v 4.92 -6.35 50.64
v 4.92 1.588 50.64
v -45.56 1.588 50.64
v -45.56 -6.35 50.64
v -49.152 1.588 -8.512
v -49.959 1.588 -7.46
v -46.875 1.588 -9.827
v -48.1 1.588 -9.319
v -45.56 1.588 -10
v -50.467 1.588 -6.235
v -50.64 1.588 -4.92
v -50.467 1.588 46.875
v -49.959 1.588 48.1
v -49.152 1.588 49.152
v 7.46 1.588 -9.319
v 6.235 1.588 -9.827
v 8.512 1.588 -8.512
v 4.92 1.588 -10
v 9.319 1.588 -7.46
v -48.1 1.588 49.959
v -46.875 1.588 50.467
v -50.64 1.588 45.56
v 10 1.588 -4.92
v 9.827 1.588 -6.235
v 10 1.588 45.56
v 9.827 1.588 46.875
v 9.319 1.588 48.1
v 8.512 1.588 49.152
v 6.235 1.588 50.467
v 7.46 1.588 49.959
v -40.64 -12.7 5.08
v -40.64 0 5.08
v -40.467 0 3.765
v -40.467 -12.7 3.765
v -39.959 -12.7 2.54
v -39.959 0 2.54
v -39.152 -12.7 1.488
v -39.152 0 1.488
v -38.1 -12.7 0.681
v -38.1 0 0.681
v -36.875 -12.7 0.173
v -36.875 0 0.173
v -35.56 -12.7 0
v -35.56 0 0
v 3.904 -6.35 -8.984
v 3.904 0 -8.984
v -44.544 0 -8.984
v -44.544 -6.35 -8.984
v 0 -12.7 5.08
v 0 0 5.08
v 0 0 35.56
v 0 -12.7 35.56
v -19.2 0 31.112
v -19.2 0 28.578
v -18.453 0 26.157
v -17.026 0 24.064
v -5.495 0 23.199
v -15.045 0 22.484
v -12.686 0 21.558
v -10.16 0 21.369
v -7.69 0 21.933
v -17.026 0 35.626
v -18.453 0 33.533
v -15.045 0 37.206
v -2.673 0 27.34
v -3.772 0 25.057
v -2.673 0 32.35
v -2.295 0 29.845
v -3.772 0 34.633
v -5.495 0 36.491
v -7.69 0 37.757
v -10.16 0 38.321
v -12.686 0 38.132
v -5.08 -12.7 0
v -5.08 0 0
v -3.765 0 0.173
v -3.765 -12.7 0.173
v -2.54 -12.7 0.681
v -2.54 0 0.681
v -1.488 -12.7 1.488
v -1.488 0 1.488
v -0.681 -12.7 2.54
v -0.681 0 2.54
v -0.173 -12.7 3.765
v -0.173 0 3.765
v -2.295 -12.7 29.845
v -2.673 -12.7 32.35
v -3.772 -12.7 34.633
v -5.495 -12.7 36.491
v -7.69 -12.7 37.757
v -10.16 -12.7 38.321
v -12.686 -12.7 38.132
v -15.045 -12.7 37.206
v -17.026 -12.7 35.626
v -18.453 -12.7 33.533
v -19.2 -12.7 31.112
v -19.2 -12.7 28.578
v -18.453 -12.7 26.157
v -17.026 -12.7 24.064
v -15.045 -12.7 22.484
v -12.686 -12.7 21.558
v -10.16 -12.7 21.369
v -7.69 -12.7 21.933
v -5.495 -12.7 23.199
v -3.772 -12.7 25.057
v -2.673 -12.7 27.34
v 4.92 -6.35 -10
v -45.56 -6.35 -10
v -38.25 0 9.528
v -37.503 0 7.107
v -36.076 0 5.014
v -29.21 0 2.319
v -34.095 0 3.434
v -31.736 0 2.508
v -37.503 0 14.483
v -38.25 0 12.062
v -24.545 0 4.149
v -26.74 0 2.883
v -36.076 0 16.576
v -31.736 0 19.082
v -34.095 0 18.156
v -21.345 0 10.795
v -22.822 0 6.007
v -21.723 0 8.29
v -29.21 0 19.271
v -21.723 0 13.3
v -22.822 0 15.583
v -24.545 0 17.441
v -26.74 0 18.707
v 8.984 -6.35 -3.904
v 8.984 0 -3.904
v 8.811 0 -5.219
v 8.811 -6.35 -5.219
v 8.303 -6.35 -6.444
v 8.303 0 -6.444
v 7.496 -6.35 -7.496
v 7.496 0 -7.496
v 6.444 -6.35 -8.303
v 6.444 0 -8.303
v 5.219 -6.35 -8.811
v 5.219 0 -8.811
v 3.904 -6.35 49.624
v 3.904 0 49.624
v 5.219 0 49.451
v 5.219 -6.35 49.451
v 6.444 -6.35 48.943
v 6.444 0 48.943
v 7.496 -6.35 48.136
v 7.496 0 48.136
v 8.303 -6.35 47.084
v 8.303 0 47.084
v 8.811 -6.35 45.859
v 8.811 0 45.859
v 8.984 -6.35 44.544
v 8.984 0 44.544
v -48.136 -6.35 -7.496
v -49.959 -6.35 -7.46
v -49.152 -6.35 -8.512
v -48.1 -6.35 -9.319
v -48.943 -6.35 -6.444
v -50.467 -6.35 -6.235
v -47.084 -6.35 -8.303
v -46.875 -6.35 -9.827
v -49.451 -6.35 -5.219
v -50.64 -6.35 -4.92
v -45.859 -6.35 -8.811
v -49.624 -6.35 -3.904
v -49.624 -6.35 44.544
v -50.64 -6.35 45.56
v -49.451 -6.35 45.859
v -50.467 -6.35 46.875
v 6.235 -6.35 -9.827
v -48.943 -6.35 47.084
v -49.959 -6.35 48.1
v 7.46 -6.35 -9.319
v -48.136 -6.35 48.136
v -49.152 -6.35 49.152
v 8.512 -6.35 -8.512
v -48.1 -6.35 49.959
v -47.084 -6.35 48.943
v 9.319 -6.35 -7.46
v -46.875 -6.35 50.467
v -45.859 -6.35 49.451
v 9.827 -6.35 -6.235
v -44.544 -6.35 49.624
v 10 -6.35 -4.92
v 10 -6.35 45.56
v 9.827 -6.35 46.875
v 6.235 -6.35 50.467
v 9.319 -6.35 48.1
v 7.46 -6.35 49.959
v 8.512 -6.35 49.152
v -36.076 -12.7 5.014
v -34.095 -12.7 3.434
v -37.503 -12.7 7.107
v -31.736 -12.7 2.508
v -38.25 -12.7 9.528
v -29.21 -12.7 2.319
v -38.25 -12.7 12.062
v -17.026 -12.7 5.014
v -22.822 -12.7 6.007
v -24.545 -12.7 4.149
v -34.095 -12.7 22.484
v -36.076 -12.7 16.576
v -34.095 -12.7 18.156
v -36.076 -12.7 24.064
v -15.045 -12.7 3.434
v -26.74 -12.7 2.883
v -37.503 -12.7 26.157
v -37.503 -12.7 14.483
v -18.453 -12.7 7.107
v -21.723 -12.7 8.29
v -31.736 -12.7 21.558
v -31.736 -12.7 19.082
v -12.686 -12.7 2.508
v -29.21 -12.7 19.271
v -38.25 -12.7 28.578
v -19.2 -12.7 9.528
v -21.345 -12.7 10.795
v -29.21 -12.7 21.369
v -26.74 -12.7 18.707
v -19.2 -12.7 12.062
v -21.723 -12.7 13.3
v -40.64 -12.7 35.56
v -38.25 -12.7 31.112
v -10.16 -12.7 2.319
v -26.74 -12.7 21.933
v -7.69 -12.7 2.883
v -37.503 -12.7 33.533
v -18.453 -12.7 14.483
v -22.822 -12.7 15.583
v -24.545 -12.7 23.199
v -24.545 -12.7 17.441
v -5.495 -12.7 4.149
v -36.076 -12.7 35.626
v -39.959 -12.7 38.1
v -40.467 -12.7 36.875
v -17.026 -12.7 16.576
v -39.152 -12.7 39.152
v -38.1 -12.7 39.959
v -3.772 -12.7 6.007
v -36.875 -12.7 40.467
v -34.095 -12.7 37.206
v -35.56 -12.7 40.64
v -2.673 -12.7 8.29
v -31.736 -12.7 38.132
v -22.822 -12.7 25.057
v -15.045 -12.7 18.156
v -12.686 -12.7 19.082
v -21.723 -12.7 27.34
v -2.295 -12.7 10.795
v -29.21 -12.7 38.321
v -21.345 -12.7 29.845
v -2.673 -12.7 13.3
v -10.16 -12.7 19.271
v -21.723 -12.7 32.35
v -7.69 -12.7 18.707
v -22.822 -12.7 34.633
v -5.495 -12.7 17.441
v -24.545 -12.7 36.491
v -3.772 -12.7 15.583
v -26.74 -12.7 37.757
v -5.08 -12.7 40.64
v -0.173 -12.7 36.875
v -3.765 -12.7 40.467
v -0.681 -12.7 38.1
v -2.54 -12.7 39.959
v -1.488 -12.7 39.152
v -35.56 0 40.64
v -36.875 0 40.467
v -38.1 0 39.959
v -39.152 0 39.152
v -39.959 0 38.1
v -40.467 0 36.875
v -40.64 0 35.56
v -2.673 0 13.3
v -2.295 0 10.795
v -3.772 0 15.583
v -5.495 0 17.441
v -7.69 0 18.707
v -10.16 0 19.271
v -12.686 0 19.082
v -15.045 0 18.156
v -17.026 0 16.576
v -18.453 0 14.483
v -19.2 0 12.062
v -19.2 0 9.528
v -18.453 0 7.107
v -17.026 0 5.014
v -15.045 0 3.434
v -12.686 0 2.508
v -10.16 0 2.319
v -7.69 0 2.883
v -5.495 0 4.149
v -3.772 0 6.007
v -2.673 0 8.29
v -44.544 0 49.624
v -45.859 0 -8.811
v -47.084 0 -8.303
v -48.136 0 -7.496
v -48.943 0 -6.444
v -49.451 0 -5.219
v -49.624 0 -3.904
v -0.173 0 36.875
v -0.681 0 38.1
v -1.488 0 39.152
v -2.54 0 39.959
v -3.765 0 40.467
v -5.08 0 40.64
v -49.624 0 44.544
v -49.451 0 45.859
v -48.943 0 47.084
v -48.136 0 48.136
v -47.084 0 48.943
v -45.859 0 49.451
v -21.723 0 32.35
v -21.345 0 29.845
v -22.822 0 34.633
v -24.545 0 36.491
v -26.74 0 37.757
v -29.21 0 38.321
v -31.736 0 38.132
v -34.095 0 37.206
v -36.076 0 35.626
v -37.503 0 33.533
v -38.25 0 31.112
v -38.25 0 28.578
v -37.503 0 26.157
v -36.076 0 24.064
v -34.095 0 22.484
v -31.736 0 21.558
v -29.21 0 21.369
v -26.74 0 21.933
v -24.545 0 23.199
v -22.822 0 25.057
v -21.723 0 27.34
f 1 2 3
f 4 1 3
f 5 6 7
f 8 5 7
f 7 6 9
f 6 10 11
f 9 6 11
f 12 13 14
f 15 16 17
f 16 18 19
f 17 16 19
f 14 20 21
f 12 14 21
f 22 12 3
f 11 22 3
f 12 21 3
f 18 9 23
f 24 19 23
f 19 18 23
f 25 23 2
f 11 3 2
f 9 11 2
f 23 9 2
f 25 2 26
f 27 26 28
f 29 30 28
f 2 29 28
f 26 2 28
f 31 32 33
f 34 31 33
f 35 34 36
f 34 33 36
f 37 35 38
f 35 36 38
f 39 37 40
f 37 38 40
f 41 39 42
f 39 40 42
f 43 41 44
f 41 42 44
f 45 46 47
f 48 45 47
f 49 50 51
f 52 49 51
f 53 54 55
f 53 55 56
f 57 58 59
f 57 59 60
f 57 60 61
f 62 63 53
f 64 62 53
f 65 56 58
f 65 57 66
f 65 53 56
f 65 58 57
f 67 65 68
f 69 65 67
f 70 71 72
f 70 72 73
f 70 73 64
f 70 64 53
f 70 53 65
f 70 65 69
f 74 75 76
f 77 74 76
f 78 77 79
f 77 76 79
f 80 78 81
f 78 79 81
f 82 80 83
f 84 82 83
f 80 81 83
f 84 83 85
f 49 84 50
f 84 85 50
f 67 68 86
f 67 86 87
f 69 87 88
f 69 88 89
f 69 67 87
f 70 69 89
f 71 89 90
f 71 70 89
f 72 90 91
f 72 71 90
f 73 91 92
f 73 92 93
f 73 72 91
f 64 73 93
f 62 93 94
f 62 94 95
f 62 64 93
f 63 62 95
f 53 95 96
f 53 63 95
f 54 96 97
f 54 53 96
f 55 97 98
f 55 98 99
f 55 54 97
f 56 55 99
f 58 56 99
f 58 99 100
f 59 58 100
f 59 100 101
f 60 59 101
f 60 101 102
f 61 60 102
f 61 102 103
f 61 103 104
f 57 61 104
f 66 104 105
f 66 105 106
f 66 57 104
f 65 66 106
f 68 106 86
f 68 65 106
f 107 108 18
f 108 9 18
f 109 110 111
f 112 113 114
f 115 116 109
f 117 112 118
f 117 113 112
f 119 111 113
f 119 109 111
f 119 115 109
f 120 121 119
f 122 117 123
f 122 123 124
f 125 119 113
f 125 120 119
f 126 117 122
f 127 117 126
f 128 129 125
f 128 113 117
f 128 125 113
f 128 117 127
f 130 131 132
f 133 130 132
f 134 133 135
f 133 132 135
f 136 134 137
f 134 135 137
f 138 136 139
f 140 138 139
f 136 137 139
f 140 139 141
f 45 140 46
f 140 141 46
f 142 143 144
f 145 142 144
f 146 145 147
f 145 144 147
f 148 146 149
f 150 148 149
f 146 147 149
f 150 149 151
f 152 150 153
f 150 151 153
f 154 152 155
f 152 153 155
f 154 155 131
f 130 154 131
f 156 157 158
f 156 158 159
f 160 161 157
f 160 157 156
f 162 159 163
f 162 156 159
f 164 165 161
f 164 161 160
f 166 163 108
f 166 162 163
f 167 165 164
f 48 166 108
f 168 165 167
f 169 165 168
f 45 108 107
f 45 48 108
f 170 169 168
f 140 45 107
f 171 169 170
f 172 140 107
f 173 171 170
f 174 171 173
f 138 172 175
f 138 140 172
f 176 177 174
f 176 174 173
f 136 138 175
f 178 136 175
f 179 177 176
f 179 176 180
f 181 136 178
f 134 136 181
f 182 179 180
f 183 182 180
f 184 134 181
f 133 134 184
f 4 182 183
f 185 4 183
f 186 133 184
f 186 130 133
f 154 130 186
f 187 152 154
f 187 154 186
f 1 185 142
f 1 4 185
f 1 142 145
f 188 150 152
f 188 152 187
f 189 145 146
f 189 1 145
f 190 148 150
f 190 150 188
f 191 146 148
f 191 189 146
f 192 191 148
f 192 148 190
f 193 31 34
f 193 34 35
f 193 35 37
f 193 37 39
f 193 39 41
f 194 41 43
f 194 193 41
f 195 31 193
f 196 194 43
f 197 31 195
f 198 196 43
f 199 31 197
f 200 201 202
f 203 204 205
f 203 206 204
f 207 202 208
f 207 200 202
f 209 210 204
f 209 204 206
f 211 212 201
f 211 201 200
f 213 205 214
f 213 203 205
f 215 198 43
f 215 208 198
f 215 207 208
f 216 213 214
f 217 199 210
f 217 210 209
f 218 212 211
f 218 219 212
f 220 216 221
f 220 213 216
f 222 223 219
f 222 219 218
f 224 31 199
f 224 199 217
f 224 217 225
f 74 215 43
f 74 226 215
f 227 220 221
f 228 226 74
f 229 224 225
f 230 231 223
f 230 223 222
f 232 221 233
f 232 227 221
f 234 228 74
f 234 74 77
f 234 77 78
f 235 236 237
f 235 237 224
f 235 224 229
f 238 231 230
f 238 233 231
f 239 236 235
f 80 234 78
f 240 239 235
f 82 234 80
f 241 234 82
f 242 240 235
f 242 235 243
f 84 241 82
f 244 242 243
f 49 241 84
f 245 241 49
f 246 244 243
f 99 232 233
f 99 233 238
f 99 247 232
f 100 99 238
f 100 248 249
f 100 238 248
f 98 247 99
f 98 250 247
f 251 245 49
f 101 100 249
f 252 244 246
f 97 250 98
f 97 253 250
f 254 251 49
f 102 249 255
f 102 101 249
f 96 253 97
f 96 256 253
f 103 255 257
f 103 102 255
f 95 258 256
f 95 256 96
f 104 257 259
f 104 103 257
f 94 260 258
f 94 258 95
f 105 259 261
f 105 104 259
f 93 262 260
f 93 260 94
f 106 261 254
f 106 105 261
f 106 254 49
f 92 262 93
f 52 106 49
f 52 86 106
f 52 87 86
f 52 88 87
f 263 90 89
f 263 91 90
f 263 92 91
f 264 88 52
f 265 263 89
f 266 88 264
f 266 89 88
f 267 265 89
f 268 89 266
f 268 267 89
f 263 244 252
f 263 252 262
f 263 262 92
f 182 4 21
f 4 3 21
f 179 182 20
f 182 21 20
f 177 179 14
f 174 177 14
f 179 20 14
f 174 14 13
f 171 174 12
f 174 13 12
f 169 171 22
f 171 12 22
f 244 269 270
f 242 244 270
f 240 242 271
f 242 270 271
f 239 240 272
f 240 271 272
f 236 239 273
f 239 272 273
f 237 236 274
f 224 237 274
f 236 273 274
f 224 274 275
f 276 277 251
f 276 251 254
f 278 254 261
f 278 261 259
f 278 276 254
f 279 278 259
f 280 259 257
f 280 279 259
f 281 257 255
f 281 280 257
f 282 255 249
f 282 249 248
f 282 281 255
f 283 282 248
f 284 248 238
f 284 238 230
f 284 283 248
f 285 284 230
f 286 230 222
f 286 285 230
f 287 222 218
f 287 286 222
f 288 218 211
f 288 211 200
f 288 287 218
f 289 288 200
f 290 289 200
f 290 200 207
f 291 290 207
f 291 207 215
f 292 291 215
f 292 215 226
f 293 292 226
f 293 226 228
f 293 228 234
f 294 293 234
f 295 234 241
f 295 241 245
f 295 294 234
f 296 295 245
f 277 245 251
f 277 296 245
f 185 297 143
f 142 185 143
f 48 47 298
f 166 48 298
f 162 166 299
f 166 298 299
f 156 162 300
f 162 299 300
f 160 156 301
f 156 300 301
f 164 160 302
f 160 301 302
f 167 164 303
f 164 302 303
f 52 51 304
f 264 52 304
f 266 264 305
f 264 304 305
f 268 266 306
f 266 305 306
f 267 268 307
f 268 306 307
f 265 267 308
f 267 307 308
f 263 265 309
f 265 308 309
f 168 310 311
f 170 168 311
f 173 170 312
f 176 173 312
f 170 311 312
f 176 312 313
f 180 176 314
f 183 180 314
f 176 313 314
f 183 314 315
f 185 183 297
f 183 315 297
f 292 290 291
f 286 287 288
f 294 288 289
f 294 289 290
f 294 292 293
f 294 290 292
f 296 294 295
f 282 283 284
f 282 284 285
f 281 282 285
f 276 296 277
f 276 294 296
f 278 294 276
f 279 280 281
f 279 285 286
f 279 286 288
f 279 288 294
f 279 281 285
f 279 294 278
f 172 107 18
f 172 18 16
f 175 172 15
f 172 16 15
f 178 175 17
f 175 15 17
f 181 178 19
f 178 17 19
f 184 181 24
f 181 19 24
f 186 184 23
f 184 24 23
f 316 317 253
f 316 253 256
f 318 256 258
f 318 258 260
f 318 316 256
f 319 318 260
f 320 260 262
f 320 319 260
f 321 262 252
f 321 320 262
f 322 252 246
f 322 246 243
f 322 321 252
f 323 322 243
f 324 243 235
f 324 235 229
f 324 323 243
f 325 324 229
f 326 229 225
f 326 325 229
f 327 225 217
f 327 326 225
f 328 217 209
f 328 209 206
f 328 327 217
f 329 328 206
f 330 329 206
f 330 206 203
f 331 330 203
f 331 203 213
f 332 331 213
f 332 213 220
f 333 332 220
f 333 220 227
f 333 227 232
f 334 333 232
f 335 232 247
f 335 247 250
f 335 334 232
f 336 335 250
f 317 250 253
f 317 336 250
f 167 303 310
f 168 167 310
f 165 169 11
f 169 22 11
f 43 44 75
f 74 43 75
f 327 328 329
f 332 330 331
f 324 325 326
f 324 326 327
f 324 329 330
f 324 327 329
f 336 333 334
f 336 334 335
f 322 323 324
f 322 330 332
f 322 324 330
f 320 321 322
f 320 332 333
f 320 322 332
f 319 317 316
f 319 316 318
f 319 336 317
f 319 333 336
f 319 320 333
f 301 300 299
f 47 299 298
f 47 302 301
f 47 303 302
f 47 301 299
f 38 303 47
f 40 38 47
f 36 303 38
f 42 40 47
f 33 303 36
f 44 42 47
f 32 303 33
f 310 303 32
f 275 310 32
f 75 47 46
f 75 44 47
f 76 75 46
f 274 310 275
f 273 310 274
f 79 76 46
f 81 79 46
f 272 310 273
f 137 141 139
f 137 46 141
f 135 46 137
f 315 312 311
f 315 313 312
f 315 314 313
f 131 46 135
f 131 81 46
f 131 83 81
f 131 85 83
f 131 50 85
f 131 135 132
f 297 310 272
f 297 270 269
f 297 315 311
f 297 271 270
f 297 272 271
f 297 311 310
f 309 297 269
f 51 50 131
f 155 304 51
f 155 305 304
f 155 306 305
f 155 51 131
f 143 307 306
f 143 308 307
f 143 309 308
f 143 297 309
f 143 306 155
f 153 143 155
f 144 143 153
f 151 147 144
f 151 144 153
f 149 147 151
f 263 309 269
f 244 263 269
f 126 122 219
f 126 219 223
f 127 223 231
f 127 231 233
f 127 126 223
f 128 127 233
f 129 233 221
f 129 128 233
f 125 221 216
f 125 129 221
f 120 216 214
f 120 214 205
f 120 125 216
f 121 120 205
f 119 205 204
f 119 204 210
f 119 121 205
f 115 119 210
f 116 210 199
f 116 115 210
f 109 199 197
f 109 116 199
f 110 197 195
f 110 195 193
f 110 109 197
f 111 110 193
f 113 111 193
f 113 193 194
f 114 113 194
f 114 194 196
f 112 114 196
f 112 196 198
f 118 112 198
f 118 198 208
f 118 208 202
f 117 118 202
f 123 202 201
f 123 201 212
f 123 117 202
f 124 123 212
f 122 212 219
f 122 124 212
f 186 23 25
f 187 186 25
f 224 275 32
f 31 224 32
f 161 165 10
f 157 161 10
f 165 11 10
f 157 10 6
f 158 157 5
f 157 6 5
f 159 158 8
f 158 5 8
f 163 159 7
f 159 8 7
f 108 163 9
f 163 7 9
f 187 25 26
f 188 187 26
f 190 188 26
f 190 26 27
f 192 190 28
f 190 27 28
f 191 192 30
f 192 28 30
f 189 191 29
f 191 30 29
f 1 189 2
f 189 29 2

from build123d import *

# Parameters (mm, degrees)
F0_R     = 8.5
F1_DEPTH = 1.5875
F2_DEPTH = 12.7
F3_DEPTH = 6.35


with BuildPart() as f1:
    # F0 (on Front) → F1 (new body)
    with BuildSketch(Plane.XZ):
        with BuildLine():
            Line((4.92, 50.64), (-45.56, 50.64))
            ThreePointArc((-45.56, 50.64), (-49.1521024484, 49.1521024484), (-50.64, 45.56))
            Line((-50.64, 45.56), (-50.64, -4.92))
            ThreePointArc((-50.64, -4.92), (-49.1521024484, -8.5121024484), (-45.56, -10))
            Line((-45.56, -10), (4.92, -10))
            ThreePointArc((4.92, -10), (8.5121024484, -8.5121024484), (10, -4.92))
            Line((10, -4.92), (10, 45.56))
            ThreePointArc((10, 45.56), (8.5121024484, 49.1521024484), (4.92, 50.64))
        make_face()
        with BuildLine():
            ThreePointArc((-49.624, 44.544), (-48.1361024484, 48.1361024484), (-44.544, 49.624))
            Line((-44.544, 49.624), (3.904, 49.624))
            ThreePointArc((3.904, 49.624), (7.4961024484, 48.1361024484), (8.984, 44.544))
            Line((8.984, 44.544), (8.984, -3.904))
            ThreePointArc((8.984, -3.904), (7.4961024484, -7.4961024484), (3.904, -8.984))
            Line((3.904, -8.984), (-44.544, -8.984))
            ThreePointArc((-44.544, -8.984), (-48.1361024484, -7.4961024484), (-49.624, -3.904))
            Line((-49.624, -3.904), (-49.624, 44.544))
        make_face(mode=Mode.SUBTRACT)
        with BuildLine():
            Line((3.904, 49.624), (-44.544, 49.624))
            ThreePointArc((-44.544, 49.624), (-48.1361024484, 48.1361024484), (-49.624, 44.544))
            Line((-49.624, 44.544), (-49.624, -3.904))
            ThreePointArc((-49.624, -3.904), (-48.1361024484, -7.4961024484), (-44.544, -8.984))
            Line((-44.544, -8.984), (3.904, -8.984))
            ThreePointArc((3.904, -8.984), (7.4961024484, -7.4961024484), (8.984, -3.904))
            Line((8.984, -3.904), (8.984, 44.544))
            ThreePointArc((8.984, 44.544), (7.4961024484, 48.1361024484), (3.904, 49.624))
        make_face()
        with BuildLine():
            ThreePointArc((-40.64, 35.56), (-39.1521024484, 39.1521024484), (-35.56, 40.64))
            Line((-35.56, 40.64), (-5.08, 40.64))
            ThreePointArc((-5.08, 40.64), (-1.4878975516, 39.1521024484), (0, 35.56))
            Line((0, 35.56), (0, 5.08))
            ThreePointArc((0, 5.08), (-1.4878975516, 1.4878975516), (-5.08, 0))
            Line((-5.08, 0), (-35.56, 0))
            ThreePointArc((-35.56, 0), (-39.1521024484, 1.4878975516), (-40.64, 5.08))
            Line((-40.64, 5.08), (-40.64, 35.56))
        make_face(mode=Mode.SUBTRACT)
        with BuildLine():
            Line((-5.08, 40.64), (-35.56, 40.64))
            ThreePointArc((-35.56, 40.64), (-39.1521024484, 39.1521024484), (-40.64, 35.56))
            Line((-40.64, 35.56), (-40.64, 5.08))
            ThreePointArc((-40.64, 5.08), (-39.1521024484, 1.4878975516), (-35.56, 0))
            Line((-35.56, 0), (-5.08, 0))
            ThreePointArc((-5.08, 0), (-1.4878975516, 1.4878975516), (0, 5.08))
            Line((0, 5.08), (0, 35.56))
            ThreePointArc((0, 35.56), (-1.4878975516, 39.1521024484), (-5.08, 40.64))
        make_face()
        with Locations((-29.845, 10.795)):
            Circle(F0_R, mode=Mode.SUBTRACT)
        with Locations((-10.795, 10.795)):
            Circle(F0_R, mode=Mode.SUBTRACT)
        with Locations((-29.845, 29.845)):
            Circle(F0_R, mode=Mode.SUBTRACT)
        with Locations((-10.795, 29.845)):
            Circle(F0_R, mode=Mode.SUBTRACT)
        with Locations((-10.795, 29.845)):
            Circle(F0_R)
        with Locations((-29.845, 29.845)):
            Circle(F0_R)
        with Locations((-29.845, 10.795)):
            Circle(F0_R)
        with Locations((-10.795, 10.795)):
            Circle(F0_R)
    extrude(amount=-F1_DEPTH)

    # F0 (on Front) → F2 (join)
    with BuildSketch(Plane.XZ):
        with BuildLine():
            Line((-5.08, 40.64), (-35.56, 40.64))
            ThreePointArc((-35.56, 40.64), (-39.1521024484, 39.1521024484), (-40.64, 35.56))
            Line((-40.64, 35.56), (-40.64, 5.08))
            ThreePointArc((-40.64, 5.08), (-39.1521024484, 1.4878975516), (-35.56, 0))
            Line((-35.56, 0), (-5.08, 0))
            ThreePointArc((-5.08, 0), (-1.4878975516, 1.4878975516), (0, 5.08))
            Line((0, 5.08), (0, 35.56))
            ThreePointArc((0, 35.56), (-1.4878975516, 39.1521024484), (-5.08, 40.64))
        make_face()
        with Locations((-29.845, 10.795)):
            Circle(F0_R, mode=Mode.SUBTRACT)
        with Locations((-10.795, 10.795)):
            Circle(F0_R, mode=Mode.SUBTRACT)
        with Locations((-29.845, 29.845)):
            Circle(F0_R, mode=Mode.SUBTRACT)
        with Locations((-10.795, 29.845)):
            Circle(F0_R, mode=Mode.SUBTRACT)
    extrude(amount=F2_DEPTH)

    # F0 (on Front) → F3 (join)
    with BuildSketch(Plane.XZ):
        with BuildLine():
            Line((4.92, 50.64), (-45.56, 50.64))
            ThreePointArc((-45.56, 50.64), (-49.1521024484, 49.1521024484), (-50.64, 45.56))
            Line((-50.64, 45.56), (-50.64, -4.92))
            ThreePointArc((-50.64, -4.92), (-49.1521024484, -8.5121024484), (-45.56, -10))
            Line((-45.56, -10), (4.92, -10))
            ThreePointArc((4.92, -10), (8.5121024484, -8.5121024484), (10, -4.92))
            Line((10, -4.92), (10, 45.56))
            ThreePointArc((10, 45.56), (8.5121024484, 49.1521024484), (4.92, 50.64))
        make_face()
        with BuildLine():
            ThreePointArc((-49.624, 44.544), (-48.1361024484, 48.1361024484), (-44.544, 49.624))
            Line((-44.544, 49.624), (3.904, 49.624))
            ThreePointArc((3.904, 49.624), (7.4961024484, 48.1361024484), (8.984, 44.544))
            Line((8.984, 44.544), (8.984, -3.904))
            ThreePointArc((8.984, -3.904), (7.4961024484, -7.4961024484), (3.904, -8.984))
            Line((3.904, -8.984), (-44.544, -8.984))
            ThreePointArc((-44.544, -8.984), (-48.1361024484, -7.4961024484), (-49.624, -3.904))
            Line((-49.624, -3.904), (-49.624, 44.544))
        make_face(mode=Mode.SUBTRACT)
    extrude(amount=F3_DEPTH)


solid = f1.part
